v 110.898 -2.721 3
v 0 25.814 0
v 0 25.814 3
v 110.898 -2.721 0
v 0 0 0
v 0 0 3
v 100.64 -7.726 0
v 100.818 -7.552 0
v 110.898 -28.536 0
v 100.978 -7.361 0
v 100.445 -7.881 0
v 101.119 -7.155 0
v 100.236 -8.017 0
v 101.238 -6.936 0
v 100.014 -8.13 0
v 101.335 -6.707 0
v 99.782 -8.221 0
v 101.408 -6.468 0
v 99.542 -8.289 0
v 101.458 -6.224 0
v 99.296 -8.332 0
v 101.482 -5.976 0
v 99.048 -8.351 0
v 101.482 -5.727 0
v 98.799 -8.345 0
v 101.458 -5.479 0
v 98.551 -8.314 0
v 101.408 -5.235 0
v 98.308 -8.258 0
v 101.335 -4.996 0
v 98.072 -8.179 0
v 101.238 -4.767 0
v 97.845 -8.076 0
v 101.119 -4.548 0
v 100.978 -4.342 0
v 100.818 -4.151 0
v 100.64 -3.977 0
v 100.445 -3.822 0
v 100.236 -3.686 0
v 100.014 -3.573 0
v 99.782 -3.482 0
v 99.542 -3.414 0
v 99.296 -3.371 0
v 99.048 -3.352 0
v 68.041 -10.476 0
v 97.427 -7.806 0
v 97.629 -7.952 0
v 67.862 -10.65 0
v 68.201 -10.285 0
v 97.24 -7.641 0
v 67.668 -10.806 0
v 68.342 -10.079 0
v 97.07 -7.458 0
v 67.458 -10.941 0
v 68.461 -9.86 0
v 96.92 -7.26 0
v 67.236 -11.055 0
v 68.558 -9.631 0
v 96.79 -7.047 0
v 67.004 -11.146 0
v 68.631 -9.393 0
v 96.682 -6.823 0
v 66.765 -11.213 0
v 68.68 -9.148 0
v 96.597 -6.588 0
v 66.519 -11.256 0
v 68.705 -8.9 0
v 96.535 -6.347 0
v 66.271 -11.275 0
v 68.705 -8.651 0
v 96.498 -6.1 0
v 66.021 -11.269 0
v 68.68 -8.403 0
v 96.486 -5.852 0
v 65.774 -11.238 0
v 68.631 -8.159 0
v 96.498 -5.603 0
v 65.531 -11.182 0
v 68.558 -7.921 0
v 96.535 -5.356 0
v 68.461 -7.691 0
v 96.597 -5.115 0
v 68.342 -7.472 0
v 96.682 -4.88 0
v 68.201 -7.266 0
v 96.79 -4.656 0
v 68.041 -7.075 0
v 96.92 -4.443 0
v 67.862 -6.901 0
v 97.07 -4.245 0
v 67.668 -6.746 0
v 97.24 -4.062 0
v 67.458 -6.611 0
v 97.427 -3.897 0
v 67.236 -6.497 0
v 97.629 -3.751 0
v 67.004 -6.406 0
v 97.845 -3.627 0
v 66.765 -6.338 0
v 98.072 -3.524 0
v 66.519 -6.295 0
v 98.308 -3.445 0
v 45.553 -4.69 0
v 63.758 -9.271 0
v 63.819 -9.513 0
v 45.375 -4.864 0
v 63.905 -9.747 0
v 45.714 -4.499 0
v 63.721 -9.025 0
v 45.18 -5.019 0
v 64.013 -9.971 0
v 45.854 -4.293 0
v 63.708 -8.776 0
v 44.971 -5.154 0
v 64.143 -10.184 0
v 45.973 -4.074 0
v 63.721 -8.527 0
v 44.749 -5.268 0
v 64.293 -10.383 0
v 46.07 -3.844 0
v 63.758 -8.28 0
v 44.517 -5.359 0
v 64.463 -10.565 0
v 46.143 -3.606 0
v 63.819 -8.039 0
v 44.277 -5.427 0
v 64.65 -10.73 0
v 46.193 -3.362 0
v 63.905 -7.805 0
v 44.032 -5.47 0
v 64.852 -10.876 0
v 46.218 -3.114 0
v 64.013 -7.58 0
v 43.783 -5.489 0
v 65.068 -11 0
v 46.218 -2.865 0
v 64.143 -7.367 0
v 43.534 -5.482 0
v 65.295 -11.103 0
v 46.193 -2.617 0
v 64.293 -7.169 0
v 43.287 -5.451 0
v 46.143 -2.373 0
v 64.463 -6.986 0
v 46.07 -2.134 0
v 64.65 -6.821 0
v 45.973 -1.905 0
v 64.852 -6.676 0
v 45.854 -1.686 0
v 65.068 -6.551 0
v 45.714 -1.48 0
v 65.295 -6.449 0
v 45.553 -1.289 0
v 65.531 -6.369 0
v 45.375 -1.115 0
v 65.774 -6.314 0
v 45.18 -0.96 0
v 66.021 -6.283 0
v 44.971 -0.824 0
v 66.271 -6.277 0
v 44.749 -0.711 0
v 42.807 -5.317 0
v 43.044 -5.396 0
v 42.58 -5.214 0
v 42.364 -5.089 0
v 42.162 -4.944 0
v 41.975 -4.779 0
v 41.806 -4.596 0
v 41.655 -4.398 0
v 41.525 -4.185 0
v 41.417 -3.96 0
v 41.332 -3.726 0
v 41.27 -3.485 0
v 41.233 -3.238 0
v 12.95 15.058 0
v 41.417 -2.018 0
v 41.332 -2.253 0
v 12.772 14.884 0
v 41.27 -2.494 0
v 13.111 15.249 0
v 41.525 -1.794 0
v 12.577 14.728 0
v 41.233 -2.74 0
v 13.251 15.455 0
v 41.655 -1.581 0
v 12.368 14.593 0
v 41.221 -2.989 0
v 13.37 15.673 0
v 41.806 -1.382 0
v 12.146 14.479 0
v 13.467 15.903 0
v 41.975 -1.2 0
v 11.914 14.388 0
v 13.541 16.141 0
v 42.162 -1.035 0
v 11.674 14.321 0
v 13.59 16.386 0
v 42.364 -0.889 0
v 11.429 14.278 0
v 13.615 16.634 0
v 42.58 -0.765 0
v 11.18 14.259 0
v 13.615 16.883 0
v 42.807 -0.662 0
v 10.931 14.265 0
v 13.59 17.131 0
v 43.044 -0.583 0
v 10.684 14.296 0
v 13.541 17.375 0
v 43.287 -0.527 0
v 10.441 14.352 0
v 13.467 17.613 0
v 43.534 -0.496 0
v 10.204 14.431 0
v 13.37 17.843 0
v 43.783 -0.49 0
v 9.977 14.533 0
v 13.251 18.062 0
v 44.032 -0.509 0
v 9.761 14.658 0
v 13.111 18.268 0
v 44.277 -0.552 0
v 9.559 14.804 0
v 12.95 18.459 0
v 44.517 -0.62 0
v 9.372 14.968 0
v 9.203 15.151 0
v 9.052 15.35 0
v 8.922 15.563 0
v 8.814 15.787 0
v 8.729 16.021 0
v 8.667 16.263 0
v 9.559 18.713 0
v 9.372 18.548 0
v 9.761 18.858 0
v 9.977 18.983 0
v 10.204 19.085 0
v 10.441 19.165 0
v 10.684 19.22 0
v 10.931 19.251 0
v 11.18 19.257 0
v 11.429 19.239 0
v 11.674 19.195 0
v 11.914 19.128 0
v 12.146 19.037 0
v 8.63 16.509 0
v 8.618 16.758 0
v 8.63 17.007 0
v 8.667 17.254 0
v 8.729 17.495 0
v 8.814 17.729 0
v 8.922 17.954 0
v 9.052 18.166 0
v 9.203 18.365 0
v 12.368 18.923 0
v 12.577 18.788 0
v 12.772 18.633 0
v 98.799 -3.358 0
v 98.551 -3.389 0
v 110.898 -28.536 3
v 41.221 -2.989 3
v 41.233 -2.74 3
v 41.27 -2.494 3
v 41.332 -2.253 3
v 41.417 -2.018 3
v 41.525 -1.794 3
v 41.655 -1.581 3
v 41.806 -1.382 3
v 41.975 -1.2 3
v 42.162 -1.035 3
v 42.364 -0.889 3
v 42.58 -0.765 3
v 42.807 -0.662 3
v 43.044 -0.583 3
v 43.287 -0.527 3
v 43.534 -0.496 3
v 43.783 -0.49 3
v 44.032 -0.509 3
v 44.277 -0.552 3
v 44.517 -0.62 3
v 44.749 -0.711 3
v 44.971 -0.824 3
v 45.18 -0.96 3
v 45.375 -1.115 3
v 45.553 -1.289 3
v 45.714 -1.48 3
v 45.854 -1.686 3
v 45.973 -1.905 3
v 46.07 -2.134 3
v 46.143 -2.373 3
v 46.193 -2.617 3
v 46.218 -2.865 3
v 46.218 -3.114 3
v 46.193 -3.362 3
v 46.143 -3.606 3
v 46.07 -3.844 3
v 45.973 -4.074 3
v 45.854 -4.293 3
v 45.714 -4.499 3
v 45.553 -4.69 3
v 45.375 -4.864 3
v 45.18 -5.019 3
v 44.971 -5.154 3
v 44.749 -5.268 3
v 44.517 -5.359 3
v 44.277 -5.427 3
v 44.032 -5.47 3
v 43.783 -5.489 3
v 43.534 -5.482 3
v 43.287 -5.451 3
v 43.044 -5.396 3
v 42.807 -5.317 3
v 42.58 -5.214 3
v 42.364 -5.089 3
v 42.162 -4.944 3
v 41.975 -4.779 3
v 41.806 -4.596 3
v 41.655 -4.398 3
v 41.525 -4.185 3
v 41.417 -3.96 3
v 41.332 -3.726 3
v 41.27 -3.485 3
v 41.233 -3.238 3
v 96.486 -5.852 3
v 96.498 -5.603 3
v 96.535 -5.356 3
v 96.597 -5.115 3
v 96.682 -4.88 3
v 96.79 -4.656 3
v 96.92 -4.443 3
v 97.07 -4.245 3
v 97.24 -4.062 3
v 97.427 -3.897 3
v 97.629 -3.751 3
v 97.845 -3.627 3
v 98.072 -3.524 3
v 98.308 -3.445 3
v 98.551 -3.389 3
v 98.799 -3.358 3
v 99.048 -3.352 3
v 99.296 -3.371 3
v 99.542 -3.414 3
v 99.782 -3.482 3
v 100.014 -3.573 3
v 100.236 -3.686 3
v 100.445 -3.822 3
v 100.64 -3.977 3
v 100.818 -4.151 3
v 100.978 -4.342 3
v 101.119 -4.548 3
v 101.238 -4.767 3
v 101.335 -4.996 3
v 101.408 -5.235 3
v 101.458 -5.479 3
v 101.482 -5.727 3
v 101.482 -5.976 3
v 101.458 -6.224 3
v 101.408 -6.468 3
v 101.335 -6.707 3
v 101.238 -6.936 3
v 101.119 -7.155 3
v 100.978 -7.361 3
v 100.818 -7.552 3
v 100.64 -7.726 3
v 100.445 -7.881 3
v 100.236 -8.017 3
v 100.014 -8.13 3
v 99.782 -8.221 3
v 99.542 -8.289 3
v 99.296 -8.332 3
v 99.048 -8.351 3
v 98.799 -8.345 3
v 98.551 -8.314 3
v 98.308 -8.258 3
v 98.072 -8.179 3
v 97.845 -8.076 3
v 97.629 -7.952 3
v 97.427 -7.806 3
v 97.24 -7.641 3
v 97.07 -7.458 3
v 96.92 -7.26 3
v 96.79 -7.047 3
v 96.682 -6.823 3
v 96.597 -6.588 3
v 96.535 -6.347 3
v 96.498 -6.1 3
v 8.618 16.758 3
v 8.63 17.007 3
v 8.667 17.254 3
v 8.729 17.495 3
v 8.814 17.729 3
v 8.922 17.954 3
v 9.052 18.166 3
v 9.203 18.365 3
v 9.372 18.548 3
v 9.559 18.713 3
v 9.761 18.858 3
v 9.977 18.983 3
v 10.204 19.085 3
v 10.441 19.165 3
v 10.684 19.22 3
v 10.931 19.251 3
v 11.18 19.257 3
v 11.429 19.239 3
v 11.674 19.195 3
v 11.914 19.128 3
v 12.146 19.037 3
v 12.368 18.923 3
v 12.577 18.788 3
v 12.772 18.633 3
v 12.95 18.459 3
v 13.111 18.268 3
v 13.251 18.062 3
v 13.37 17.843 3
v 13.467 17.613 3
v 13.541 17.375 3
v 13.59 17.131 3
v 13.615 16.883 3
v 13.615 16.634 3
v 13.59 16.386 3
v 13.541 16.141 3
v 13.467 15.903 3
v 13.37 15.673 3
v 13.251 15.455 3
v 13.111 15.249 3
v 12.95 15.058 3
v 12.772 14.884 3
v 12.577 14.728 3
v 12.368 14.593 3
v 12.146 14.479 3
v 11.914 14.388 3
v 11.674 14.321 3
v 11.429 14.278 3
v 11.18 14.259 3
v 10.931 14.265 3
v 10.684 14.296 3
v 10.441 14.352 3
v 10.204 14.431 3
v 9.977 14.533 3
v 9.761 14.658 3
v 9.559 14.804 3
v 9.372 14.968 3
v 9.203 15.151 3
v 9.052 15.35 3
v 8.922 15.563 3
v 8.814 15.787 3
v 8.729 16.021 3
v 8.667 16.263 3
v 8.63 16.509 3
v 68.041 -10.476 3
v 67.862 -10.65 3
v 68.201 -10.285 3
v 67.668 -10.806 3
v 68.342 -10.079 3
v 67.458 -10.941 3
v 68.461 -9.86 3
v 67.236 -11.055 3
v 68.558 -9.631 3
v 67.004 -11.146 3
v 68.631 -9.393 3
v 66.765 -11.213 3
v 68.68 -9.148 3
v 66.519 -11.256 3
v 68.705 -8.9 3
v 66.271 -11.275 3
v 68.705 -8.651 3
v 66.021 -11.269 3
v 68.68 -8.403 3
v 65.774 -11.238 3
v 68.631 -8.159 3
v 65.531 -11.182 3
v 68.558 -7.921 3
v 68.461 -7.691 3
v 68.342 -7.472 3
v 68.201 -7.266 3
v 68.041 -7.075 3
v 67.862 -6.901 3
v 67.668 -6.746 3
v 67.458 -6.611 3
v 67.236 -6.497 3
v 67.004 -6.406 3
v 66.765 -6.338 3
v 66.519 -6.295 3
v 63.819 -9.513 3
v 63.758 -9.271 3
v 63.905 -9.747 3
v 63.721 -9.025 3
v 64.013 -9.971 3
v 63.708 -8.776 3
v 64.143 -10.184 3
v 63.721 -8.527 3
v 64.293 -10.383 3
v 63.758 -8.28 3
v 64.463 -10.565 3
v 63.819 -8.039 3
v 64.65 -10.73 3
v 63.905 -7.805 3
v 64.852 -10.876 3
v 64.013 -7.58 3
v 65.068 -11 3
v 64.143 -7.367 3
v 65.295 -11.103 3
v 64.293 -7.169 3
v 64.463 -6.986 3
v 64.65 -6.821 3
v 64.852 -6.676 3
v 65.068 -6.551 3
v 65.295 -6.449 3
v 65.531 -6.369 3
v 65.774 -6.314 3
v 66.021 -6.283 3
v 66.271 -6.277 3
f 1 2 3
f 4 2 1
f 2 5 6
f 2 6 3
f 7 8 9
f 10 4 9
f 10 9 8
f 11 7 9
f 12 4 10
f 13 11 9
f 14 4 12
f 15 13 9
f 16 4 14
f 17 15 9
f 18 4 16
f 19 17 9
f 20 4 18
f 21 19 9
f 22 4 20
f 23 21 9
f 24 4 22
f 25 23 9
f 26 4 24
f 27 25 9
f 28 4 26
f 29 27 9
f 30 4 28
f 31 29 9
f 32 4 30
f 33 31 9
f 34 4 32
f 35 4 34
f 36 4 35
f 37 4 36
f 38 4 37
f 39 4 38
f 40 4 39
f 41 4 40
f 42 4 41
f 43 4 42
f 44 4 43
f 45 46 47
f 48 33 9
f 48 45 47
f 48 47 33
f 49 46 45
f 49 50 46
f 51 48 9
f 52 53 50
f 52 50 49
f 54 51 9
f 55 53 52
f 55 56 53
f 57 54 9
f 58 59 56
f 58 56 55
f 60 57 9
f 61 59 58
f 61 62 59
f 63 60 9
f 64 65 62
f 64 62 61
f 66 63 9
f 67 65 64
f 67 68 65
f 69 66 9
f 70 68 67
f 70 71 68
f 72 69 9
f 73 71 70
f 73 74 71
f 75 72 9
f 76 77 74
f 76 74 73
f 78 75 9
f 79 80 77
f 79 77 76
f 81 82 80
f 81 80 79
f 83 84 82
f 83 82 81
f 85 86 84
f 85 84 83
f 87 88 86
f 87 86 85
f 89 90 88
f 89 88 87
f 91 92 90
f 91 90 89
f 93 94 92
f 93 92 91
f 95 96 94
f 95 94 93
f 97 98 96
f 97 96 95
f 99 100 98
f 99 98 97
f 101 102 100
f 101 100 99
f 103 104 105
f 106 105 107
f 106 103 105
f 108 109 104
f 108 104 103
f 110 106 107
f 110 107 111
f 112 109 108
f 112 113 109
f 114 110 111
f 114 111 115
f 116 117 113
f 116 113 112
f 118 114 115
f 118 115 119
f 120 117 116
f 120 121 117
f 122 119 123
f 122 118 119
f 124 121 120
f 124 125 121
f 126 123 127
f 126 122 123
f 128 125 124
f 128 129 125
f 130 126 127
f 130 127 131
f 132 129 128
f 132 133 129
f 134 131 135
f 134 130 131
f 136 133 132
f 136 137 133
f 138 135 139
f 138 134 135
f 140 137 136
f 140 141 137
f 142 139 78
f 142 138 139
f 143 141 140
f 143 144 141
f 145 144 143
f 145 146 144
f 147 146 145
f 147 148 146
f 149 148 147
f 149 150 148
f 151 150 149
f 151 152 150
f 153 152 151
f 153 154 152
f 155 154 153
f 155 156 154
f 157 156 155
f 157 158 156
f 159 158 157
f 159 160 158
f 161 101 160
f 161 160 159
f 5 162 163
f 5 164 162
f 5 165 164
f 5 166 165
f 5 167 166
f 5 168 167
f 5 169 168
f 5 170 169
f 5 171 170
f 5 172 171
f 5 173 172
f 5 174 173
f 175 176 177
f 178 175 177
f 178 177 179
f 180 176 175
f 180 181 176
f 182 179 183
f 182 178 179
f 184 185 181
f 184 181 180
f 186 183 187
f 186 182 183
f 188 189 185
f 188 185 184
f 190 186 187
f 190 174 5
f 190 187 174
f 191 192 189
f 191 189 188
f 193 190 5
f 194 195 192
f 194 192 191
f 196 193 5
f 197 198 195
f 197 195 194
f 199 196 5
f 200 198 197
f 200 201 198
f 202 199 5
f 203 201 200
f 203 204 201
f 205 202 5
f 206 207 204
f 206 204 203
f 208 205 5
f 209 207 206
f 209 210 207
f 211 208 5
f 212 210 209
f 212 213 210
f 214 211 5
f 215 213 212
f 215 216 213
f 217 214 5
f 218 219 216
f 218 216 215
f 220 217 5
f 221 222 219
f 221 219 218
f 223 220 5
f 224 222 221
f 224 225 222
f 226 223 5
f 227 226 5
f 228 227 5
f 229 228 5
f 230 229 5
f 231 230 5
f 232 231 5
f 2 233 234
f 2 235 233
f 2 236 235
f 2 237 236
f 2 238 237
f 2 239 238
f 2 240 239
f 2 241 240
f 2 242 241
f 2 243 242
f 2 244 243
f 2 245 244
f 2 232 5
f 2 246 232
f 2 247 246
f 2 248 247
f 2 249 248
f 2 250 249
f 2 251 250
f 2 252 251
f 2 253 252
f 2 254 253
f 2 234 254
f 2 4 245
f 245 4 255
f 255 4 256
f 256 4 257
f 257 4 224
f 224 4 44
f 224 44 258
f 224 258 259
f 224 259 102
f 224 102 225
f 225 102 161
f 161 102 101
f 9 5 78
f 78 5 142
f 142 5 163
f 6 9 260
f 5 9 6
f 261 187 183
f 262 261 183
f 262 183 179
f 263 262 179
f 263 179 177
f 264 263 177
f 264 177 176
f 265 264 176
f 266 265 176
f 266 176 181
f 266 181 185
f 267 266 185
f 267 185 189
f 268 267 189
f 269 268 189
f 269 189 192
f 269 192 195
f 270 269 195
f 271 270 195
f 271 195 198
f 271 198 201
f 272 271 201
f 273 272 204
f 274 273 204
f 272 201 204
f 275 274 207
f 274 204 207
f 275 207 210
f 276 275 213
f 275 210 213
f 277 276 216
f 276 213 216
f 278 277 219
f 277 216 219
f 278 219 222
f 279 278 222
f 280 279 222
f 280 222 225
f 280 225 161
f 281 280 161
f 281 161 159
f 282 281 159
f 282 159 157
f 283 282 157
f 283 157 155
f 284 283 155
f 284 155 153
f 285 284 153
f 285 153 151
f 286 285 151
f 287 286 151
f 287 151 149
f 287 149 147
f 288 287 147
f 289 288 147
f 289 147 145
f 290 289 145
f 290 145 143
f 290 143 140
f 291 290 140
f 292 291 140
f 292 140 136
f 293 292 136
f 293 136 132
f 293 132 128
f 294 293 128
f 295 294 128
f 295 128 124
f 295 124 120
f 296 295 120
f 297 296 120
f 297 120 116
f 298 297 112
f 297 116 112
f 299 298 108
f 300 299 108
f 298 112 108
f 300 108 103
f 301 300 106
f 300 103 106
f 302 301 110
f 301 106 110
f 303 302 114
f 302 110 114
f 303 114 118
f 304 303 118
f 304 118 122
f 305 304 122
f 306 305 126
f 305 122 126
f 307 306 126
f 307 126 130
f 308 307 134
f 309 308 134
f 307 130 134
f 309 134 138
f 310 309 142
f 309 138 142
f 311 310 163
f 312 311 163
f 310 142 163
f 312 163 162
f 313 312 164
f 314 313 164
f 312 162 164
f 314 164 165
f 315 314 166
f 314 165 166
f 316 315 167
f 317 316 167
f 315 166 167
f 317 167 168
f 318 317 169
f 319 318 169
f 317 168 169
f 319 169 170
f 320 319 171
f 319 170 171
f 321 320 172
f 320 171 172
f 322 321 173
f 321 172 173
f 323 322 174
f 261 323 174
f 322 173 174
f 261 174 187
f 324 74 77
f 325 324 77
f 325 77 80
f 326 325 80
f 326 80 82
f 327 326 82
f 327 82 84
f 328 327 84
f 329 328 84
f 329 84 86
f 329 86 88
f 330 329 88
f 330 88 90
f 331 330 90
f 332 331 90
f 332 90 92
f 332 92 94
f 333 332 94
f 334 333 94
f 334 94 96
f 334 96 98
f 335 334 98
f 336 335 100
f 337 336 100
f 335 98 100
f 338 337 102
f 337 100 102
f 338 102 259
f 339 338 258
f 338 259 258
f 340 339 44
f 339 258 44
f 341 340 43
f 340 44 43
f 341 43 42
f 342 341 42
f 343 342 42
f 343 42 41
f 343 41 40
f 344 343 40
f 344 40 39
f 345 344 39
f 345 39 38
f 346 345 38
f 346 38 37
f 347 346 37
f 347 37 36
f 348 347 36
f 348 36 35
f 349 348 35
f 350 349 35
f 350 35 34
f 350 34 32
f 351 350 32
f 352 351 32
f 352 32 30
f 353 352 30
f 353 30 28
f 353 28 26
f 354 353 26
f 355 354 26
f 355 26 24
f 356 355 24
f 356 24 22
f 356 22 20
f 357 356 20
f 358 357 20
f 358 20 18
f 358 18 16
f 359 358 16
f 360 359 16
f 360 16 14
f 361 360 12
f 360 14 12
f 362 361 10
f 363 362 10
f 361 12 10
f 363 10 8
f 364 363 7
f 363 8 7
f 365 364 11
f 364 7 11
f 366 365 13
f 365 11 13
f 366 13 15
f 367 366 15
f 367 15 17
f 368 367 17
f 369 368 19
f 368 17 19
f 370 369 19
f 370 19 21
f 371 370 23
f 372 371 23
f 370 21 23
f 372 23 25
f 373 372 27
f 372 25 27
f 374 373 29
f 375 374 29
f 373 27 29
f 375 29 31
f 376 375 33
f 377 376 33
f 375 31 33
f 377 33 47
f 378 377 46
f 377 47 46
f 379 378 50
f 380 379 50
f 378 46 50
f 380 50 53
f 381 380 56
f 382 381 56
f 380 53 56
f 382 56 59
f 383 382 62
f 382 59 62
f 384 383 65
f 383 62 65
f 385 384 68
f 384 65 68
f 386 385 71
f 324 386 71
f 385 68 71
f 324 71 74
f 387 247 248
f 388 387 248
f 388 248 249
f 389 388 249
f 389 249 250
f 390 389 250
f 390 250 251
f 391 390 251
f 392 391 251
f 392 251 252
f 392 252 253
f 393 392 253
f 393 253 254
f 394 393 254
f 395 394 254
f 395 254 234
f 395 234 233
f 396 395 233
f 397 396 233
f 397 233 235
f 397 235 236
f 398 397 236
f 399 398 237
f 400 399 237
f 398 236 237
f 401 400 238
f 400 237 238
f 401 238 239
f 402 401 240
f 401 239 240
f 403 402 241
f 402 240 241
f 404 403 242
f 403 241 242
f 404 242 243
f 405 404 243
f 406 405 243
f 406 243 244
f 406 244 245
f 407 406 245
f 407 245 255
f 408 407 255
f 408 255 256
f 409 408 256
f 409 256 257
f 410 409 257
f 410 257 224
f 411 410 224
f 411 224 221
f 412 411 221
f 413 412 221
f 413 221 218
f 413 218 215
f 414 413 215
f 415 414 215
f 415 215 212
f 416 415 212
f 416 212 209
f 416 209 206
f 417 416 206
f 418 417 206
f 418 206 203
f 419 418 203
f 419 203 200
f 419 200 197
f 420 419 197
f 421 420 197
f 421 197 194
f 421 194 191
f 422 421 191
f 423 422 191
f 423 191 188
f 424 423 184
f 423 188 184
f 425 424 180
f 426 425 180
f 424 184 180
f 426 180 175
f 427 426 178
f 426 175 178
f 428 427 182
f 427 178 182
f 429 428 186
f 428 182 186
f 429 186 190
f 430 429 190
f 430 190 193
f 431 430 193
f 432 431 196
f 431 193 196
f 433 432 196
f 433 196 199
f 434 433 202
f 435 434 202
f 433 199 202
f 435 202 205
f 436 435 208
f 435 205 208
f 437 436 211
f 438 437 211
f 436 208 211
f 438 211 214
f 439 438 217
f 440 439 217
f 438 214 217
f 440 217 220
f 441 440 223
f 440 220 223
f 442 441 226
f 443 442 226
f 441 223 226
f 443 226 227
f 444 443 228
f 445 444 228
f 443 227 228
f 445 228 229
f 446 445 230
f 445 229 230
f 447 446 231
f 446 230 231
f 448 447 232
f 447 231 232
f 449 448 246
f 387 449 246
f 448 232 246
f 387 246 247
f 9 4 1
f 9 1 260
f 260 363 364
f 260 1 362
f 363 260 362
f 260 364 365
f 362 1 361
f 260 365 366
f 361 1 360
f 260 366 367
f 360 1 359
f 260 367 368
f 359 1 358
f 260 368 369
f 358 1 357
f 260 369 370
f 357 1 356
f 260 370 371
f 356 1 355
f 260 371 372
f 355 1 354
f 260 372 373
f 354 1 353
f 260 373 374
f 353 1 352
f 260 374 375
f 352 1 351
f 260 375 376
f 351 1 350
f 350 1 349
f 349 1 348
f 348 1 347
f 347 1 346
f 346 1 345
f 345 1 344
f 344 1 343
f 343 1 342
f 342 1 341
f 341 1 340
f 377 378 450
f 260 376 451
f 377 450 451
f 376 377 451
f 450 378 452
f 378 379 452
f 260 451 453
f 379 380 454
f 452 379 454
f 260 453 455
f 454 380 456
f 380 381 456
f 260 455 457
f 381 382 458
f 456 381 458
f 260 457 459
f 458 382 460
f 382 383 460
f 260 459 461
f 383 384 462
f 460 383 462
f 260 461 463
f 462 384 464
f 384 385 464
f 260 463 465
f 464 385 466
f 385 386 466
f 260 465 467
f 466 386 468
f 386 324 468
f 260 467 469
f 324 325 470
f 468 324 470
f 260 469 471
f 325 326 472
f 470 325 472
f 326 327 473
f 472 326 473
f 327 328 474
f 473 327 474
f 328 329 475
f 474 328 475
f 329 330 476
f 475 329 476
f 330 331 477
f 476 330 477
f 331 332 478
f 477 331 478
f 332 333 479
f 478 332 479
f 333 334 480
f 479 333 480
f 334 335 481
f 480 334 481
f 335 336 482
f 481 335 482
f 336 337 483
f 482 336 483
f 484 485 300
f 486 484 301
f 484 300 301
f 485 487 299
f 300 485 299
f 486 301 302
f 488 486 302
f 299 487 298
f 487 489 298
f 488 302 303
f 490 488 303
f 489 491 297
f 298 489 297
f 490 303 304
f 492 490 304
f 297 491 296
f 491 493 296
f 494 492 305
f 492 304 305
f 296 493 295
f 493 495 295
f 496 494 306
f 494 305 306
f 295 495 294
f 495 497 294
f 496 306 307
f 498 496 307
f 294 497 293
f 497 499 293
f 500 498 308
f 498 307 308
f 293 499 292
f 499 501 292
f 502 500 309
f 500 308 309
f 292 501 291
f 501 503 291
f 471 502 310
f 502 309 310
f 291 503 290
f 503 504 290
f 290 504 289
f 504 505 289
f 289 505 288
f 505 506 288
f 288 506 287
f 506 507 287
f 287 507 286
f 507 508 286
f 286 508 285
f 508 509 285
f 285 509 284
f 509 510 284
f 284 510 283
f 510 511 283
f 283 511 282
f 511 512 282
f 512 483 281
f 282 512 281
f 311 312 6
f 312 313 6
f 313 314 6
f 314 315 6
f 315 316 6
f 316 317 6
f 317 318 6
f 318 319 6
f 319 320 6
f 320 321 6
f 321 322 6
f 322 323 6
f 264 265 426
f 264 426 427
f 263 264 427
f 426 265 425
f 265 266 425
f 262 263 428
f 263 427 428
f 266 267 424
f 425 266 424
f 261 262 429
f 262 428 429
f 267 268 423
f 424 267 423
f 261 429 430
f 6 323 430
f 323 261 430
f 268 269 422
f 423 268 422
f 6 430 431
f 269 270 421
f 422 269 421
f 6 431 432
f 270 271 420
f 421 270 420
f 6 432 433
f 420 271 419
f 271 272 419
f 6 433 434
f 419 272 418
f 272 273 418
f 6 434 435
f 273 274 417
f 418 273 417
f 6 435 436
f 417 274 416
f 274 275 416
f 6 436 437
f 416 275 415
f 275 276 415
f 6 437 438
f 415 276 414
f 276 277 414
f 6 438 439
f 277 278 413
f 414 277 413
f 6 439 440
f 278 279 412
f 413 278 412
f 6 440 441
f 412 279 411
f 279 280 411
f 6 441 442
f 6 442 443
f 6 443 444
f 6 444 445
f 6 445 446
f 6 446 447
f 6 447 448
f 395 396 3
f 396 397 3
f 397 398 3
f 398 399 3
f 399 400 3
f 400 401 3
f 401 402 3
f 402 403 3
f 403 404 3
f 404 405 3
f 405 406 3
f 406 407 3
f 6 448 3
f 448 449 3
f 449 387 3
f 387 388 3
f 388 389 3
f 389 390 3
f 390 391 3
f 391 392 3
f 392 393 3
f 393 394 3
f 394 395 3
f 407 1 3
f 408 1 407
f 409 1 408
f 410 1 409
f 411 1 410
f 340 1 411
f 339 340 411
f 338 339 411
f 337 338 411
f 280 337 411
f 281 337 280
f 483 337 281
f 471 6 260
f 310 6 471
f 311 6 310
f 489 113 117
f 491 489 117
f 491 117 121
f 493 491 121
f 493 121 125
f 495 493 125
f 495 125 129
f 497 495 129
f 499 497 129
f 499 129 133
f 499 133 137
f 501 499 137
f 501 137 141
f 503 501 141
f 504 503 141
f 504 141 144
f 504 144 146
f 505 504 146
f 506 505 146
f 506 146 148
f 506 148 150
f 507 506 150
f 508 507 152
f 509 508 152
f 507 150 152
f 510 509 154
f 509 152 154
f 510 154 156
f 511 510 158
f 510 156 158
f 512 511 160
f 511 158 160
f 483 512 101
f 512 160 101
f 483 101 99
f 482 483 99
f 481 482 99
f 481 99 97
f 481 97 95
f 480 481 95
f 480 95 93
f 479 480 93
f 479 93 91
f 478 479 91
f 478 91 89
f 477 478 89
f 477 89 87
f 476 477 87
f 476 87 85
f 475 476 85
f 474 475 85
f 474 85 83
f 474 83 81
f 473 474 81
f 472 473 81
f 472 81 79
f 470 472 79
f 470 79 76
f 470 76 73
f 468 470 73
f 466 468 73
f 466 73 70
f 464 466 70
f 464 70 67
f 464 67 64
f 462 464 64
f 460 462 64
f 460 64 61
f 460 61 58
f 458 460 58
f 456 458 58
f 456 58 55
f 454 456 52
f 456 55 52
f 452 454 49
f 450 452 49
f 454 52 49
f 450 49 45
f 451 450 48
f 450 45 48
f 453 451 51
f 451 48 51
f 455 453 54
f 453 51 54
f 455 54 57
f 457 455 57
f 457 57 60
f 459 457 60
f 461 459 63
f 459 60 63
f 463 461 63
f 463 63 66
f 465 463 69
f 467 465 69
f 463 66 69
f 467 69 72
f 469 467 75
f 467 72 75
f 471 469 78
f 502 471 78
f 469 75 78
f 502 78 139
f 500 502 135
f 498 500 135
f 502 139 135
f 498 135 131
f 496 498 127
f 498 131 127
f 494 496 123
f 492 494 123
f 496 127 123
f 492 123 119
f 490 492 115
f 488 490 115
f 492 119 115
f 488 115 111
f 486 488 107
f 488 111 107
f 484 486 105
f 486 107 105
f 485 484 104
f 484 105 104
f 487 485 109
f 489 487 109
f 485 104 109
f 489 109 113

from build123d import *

# Parameters (mm, degrees)
RESSALTO_EXTRUS_O1_DEPTH                = 3
BROCA_DE_ROSQUEAR_PARA_TARRAXA_DE_M61_D = 5


with BuildPart() as part:
    # Esboço1 → Ressalto-extrusão1 (new body)
    with BuildSketch(Plane.XY):
        Polygon((0, 0), (0, 25.814370739), (110.897531805, -2.721177961), (110.897531805, -28.5355487), align=None)
    extrude(amount=RESSALTO_EXTRUS_O1_DEPTH)

    # Broca de rosquear para tarraxa de M61 (through all)
    with Locations(Plane.XY.offset(3)):
        with Locations((11.117838312, 16.758140178), (43.720802317, -2.989400019), (66.208276673, -8.775754406), (98.985562185, -5.851503814)):
            Hole(BROCA_DE_ROSQUEAR_PARA_TARRAXA_DE_M61_D / 2)


solid = part.part
